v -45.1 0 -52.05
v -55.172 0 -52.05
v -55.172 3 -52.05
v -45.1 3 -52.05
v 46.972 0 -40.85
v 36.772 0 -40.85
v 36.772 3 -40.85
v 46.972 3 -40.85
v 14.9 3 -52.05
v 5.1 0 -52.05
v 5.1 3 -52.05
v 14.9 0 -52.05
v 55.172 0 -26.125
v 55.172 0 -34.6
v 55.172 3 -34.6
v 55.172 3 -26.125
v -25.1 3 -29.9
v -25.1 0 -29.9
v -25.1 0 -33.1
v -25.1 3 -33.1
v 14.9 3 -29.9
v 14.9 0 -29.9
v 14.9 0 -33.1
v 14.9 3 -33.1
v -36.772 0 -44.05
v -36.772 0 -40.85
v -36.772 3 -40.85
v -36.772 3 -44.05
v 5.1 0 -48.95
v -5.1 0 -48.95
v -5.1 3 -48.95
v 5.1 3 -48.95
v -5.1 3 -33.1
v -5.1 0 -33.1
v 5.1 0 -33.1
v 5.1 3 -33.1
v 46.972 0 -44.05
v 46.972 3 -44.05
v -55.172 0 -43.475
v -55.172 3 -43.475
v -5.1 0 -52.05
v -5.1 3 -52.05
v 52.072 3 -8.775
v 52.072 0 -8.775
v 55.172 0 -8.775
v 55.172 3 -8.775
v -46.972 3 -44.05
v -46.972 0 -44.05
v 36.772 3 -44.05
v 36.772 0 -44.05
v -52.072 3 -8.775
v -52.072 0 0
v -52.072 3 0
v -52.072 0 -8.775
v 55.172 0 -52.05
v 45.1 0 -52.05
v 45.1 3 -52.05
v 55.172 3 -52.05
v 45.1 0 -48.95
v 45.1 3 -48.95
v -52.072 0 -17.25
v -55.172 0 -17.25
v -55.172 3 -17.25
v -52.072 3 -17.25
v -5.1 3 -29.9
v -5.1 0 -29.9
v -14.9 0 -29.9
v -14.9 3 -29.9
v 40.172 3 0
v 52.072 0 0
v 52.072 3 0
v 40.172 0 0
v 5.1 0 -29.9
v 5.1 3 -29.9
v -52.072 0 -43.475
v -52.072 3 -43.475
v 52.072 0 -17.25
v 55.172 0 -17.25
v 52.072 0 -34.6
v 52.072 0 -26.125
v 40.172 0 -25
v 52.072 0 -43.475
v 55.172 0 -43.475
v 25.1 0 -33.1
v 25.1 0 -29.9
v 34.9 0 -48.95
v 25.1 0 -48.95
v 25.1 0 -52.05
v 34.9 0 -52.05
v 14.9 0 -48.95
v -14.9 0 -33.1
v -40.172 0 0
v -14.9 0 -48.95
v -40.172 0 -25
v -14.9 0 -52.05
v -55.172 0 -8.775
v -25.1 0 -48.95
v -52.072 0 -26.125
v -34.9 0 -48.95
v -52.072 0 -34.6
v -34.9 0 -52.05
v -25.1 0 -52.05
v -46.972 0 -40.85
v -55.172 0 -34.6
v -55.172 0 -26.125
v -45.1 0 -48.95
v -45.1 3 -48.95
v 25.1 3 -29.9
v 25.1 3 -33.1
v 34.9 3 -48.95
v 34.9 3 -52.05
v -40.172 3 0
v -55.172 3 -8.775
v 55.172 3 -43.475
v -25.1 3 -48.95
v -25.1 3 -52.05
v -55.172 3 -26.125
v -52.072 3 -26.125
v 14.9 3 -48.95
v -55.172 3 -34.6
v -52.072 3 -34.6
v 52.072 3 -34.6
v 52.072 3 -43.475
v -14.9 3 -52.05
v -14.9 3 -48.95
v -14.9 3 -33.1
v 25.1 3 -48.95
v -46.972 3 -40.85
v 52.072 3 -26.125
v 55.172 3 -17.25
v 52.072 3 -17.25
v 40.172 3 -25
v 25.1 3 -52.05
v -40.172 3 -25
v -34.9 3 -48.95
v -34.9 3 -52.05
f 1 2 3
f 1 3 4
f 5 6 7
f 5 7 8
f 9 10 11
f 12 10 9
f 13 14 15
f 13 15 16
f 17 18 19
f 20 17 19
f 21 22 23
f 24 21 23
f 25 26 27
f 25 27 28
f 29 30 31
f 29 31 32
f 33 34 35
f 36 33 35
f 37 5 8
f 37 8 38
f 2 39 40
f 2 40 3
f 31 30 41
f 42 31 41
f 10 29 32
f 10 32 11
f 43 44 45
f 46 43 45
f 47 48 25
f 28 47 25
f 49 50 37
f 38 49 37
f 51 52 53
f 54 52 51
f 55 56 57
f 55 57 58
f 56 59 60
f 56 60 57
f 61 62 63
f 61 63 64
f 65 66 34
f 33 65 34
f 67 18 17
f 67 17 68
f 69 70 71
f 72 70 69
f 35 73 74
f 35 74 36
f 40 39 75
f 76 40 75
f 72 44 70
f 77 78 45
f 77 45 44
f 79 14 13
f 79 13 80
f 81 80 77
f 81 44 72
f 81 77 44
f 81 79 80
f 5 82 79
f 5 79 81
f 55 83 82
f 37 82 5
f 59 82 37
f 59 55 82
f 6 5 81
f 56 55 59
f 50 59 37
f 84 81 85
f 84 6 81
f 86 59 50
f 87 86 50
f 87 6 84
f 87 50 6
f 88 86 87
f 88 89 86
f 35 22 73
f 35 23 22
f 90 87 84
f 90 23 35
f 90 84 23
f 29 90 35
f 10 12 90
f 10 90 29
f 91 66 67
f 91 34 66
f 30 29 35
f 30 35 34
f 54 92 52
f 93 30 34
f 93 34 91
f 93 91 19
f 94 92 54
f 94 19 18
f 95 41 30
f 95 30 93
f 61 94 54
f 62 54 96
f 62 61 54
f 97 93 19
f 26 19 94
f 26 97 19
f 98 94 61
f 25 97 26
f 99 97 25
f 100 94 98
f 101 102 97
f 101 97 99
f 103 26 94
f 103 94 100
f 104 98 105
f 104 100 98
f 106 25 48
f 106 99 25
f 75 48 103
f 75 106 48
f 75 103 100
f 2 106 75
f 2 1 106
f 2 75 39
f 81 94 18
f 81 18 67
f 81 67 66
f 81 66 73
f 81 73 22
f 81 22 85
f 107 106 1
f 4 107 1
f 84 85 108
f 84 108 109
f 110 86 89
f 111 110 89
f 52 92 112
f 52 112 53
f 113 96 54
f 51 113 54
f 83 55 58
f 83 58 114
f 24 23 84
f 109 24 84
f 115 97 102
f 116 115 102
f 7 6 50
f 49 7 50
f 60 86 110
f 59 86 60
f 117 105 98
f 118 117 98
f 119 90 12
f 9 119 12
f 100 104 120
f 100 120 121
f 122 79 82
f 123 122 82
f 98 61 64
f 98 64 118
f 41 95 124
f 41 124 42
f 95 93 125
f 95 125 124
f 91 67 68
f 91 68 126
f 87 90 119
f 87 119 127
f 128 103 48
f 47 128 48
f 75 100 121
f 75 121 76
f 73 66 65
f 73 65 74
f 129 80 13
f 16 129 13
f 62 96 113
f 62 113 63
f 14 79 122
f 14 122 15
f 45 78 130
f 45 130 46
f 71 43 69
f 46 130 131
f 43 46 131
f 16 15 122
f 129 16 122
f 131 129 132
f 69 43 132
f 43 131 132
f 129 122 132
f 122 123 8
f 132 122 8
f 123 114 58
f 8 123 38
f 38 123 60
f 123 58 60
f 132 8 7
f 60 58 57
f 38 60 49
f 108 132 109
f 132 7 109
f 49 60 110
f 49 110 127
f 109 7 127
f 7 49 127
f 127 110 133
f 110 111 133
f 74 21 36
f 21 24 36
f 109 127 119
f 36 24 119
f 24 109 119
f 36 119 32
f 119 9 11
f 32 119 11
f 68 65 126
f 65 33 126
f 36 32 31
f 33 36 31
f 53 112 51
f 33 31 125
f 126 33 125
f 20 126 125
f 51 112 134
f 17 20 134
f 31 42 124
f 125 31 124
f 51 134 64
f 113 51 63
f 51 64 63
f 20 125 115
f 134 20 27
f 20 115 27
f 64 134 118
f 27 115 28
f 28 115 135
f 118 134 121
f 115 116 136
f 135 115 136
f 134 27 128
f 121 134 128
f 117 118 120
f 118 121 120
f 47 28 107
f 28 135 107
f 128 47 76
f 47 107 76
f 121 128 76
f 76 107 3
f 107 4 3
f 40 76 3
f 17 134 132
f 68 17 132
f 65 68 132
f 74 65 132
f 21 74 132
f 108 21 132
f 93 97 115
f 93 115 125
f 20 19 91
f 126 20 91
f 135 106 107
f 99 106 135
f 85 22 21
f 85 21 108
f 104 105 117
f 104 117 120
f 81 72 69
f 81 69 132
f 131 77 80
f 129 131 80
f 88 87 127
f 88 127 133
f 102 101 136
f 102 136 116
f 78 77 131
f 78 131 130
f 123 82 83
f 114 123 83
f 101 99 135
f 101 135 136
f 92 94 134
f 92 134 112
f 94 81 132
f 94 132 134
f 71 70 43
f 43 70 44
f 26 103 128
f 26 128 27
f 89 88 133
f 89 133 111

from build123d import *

# Parameters (mm, degrees)
BOSS_EXTRUDE1_DEPTH = 3
SKETCH4_W           = 10.2
SKETCH4_H           = 3.2
SKETCH4_W_2         = 3.2
SKETCH4_H_2         = 8.875
CUT_EXTRUDE1_DEPTH  = 4


with BuildPart() as part:
    # Sketch1 → Boss-Extrude1 (new body)
    with BuildSketch(Plane(origin=(0, 0, 0), x_dir=(1, 0, 0), z_dir=(0, 1, 0))):
        Polygon((-55.172217102, 52.05), (55.172217102, 52.05), (55.172217102, 0), (40.172217102, 0), (40.172217102, 25), (-40.172217102, 25), (-40.172217102, 0), (-55.172217102, 0), align=None)
    extrude(amount=BOSS_EXTRUDE1_DEPTH)

    # Sketch4 → Cut-Extrude1 (cut, through all)
    with BuildSketch(Plane(origin=(0, 0, 0), x_dir=(1, 0, 0), z_dir=(0, 1, 0))):
        with Locations((40, 50.55)):
            Rectangle(SKETCH4_W, SKETCH4_H)
        with Locations((41.872217102, 42.45)):
            Rectangle(SKETCH4_W, SKETCH4_H)
        with Locations((53.672217102, 39.0375)):
            Rectangle(SKETCH4_W_2, SKETCH4_H_2)
        with Locations((53.672217102, 21.6875)):
            Rectangle(SKETCH4_W_2, SKETCH4_H_2)
        with Locations((53.672217102, 4.3375)):
            Rectangle(SKETCH4_W_2, SKETCH4_H_2)
        with Locations((20, 31.5)):
            Rectangle(SKETCH4_W, SKETCH4_H)
        with Locations((0, 31.5)):
            Rectangle(SKETCH4_W, SKETCH4_H)
        with Locations((20, 50.55)):
            Rectangle(SKETCH4_W, SKETCH4_H)
        with Locations((-53.672217102, 4.3375)):
            Rectangle(SKETCH4_W_2, SKETCH4_H_2)
        with Locations((-53.672217102, 21.6875)):
            Rectangle(SKETCH4_W_2, SKETCH4_H_2)
        with Locations((-53.672217102, 39.0375)):
            Rectangle(SKETCH4_W_2, SKETCH4_H_2)
        with Locations((-40, 50.55)):
            Rectangle(SKETCH4_W, SKETCH4_H)
        with Locations((-41.872217102, 42.45)):
            Rectangle(SKETCH4_W, SKETCH4_H)
        with Locations((0, 50.55)):
            Rectangle(SKETCH4_W, SKETCH4_H)
        with Locations((-20, 31.5)):
            Rectangle(SKETCH4_W, SKETCH4_H)
        with Locations((-20, 50.55)):
            Rectangle(SKETCH4_W, SKETCH4_H)
    extrude(amount=CUT_EXTRUDE1_DEPTH, mode=Mode.SUBTRACT)


solid = part.part
